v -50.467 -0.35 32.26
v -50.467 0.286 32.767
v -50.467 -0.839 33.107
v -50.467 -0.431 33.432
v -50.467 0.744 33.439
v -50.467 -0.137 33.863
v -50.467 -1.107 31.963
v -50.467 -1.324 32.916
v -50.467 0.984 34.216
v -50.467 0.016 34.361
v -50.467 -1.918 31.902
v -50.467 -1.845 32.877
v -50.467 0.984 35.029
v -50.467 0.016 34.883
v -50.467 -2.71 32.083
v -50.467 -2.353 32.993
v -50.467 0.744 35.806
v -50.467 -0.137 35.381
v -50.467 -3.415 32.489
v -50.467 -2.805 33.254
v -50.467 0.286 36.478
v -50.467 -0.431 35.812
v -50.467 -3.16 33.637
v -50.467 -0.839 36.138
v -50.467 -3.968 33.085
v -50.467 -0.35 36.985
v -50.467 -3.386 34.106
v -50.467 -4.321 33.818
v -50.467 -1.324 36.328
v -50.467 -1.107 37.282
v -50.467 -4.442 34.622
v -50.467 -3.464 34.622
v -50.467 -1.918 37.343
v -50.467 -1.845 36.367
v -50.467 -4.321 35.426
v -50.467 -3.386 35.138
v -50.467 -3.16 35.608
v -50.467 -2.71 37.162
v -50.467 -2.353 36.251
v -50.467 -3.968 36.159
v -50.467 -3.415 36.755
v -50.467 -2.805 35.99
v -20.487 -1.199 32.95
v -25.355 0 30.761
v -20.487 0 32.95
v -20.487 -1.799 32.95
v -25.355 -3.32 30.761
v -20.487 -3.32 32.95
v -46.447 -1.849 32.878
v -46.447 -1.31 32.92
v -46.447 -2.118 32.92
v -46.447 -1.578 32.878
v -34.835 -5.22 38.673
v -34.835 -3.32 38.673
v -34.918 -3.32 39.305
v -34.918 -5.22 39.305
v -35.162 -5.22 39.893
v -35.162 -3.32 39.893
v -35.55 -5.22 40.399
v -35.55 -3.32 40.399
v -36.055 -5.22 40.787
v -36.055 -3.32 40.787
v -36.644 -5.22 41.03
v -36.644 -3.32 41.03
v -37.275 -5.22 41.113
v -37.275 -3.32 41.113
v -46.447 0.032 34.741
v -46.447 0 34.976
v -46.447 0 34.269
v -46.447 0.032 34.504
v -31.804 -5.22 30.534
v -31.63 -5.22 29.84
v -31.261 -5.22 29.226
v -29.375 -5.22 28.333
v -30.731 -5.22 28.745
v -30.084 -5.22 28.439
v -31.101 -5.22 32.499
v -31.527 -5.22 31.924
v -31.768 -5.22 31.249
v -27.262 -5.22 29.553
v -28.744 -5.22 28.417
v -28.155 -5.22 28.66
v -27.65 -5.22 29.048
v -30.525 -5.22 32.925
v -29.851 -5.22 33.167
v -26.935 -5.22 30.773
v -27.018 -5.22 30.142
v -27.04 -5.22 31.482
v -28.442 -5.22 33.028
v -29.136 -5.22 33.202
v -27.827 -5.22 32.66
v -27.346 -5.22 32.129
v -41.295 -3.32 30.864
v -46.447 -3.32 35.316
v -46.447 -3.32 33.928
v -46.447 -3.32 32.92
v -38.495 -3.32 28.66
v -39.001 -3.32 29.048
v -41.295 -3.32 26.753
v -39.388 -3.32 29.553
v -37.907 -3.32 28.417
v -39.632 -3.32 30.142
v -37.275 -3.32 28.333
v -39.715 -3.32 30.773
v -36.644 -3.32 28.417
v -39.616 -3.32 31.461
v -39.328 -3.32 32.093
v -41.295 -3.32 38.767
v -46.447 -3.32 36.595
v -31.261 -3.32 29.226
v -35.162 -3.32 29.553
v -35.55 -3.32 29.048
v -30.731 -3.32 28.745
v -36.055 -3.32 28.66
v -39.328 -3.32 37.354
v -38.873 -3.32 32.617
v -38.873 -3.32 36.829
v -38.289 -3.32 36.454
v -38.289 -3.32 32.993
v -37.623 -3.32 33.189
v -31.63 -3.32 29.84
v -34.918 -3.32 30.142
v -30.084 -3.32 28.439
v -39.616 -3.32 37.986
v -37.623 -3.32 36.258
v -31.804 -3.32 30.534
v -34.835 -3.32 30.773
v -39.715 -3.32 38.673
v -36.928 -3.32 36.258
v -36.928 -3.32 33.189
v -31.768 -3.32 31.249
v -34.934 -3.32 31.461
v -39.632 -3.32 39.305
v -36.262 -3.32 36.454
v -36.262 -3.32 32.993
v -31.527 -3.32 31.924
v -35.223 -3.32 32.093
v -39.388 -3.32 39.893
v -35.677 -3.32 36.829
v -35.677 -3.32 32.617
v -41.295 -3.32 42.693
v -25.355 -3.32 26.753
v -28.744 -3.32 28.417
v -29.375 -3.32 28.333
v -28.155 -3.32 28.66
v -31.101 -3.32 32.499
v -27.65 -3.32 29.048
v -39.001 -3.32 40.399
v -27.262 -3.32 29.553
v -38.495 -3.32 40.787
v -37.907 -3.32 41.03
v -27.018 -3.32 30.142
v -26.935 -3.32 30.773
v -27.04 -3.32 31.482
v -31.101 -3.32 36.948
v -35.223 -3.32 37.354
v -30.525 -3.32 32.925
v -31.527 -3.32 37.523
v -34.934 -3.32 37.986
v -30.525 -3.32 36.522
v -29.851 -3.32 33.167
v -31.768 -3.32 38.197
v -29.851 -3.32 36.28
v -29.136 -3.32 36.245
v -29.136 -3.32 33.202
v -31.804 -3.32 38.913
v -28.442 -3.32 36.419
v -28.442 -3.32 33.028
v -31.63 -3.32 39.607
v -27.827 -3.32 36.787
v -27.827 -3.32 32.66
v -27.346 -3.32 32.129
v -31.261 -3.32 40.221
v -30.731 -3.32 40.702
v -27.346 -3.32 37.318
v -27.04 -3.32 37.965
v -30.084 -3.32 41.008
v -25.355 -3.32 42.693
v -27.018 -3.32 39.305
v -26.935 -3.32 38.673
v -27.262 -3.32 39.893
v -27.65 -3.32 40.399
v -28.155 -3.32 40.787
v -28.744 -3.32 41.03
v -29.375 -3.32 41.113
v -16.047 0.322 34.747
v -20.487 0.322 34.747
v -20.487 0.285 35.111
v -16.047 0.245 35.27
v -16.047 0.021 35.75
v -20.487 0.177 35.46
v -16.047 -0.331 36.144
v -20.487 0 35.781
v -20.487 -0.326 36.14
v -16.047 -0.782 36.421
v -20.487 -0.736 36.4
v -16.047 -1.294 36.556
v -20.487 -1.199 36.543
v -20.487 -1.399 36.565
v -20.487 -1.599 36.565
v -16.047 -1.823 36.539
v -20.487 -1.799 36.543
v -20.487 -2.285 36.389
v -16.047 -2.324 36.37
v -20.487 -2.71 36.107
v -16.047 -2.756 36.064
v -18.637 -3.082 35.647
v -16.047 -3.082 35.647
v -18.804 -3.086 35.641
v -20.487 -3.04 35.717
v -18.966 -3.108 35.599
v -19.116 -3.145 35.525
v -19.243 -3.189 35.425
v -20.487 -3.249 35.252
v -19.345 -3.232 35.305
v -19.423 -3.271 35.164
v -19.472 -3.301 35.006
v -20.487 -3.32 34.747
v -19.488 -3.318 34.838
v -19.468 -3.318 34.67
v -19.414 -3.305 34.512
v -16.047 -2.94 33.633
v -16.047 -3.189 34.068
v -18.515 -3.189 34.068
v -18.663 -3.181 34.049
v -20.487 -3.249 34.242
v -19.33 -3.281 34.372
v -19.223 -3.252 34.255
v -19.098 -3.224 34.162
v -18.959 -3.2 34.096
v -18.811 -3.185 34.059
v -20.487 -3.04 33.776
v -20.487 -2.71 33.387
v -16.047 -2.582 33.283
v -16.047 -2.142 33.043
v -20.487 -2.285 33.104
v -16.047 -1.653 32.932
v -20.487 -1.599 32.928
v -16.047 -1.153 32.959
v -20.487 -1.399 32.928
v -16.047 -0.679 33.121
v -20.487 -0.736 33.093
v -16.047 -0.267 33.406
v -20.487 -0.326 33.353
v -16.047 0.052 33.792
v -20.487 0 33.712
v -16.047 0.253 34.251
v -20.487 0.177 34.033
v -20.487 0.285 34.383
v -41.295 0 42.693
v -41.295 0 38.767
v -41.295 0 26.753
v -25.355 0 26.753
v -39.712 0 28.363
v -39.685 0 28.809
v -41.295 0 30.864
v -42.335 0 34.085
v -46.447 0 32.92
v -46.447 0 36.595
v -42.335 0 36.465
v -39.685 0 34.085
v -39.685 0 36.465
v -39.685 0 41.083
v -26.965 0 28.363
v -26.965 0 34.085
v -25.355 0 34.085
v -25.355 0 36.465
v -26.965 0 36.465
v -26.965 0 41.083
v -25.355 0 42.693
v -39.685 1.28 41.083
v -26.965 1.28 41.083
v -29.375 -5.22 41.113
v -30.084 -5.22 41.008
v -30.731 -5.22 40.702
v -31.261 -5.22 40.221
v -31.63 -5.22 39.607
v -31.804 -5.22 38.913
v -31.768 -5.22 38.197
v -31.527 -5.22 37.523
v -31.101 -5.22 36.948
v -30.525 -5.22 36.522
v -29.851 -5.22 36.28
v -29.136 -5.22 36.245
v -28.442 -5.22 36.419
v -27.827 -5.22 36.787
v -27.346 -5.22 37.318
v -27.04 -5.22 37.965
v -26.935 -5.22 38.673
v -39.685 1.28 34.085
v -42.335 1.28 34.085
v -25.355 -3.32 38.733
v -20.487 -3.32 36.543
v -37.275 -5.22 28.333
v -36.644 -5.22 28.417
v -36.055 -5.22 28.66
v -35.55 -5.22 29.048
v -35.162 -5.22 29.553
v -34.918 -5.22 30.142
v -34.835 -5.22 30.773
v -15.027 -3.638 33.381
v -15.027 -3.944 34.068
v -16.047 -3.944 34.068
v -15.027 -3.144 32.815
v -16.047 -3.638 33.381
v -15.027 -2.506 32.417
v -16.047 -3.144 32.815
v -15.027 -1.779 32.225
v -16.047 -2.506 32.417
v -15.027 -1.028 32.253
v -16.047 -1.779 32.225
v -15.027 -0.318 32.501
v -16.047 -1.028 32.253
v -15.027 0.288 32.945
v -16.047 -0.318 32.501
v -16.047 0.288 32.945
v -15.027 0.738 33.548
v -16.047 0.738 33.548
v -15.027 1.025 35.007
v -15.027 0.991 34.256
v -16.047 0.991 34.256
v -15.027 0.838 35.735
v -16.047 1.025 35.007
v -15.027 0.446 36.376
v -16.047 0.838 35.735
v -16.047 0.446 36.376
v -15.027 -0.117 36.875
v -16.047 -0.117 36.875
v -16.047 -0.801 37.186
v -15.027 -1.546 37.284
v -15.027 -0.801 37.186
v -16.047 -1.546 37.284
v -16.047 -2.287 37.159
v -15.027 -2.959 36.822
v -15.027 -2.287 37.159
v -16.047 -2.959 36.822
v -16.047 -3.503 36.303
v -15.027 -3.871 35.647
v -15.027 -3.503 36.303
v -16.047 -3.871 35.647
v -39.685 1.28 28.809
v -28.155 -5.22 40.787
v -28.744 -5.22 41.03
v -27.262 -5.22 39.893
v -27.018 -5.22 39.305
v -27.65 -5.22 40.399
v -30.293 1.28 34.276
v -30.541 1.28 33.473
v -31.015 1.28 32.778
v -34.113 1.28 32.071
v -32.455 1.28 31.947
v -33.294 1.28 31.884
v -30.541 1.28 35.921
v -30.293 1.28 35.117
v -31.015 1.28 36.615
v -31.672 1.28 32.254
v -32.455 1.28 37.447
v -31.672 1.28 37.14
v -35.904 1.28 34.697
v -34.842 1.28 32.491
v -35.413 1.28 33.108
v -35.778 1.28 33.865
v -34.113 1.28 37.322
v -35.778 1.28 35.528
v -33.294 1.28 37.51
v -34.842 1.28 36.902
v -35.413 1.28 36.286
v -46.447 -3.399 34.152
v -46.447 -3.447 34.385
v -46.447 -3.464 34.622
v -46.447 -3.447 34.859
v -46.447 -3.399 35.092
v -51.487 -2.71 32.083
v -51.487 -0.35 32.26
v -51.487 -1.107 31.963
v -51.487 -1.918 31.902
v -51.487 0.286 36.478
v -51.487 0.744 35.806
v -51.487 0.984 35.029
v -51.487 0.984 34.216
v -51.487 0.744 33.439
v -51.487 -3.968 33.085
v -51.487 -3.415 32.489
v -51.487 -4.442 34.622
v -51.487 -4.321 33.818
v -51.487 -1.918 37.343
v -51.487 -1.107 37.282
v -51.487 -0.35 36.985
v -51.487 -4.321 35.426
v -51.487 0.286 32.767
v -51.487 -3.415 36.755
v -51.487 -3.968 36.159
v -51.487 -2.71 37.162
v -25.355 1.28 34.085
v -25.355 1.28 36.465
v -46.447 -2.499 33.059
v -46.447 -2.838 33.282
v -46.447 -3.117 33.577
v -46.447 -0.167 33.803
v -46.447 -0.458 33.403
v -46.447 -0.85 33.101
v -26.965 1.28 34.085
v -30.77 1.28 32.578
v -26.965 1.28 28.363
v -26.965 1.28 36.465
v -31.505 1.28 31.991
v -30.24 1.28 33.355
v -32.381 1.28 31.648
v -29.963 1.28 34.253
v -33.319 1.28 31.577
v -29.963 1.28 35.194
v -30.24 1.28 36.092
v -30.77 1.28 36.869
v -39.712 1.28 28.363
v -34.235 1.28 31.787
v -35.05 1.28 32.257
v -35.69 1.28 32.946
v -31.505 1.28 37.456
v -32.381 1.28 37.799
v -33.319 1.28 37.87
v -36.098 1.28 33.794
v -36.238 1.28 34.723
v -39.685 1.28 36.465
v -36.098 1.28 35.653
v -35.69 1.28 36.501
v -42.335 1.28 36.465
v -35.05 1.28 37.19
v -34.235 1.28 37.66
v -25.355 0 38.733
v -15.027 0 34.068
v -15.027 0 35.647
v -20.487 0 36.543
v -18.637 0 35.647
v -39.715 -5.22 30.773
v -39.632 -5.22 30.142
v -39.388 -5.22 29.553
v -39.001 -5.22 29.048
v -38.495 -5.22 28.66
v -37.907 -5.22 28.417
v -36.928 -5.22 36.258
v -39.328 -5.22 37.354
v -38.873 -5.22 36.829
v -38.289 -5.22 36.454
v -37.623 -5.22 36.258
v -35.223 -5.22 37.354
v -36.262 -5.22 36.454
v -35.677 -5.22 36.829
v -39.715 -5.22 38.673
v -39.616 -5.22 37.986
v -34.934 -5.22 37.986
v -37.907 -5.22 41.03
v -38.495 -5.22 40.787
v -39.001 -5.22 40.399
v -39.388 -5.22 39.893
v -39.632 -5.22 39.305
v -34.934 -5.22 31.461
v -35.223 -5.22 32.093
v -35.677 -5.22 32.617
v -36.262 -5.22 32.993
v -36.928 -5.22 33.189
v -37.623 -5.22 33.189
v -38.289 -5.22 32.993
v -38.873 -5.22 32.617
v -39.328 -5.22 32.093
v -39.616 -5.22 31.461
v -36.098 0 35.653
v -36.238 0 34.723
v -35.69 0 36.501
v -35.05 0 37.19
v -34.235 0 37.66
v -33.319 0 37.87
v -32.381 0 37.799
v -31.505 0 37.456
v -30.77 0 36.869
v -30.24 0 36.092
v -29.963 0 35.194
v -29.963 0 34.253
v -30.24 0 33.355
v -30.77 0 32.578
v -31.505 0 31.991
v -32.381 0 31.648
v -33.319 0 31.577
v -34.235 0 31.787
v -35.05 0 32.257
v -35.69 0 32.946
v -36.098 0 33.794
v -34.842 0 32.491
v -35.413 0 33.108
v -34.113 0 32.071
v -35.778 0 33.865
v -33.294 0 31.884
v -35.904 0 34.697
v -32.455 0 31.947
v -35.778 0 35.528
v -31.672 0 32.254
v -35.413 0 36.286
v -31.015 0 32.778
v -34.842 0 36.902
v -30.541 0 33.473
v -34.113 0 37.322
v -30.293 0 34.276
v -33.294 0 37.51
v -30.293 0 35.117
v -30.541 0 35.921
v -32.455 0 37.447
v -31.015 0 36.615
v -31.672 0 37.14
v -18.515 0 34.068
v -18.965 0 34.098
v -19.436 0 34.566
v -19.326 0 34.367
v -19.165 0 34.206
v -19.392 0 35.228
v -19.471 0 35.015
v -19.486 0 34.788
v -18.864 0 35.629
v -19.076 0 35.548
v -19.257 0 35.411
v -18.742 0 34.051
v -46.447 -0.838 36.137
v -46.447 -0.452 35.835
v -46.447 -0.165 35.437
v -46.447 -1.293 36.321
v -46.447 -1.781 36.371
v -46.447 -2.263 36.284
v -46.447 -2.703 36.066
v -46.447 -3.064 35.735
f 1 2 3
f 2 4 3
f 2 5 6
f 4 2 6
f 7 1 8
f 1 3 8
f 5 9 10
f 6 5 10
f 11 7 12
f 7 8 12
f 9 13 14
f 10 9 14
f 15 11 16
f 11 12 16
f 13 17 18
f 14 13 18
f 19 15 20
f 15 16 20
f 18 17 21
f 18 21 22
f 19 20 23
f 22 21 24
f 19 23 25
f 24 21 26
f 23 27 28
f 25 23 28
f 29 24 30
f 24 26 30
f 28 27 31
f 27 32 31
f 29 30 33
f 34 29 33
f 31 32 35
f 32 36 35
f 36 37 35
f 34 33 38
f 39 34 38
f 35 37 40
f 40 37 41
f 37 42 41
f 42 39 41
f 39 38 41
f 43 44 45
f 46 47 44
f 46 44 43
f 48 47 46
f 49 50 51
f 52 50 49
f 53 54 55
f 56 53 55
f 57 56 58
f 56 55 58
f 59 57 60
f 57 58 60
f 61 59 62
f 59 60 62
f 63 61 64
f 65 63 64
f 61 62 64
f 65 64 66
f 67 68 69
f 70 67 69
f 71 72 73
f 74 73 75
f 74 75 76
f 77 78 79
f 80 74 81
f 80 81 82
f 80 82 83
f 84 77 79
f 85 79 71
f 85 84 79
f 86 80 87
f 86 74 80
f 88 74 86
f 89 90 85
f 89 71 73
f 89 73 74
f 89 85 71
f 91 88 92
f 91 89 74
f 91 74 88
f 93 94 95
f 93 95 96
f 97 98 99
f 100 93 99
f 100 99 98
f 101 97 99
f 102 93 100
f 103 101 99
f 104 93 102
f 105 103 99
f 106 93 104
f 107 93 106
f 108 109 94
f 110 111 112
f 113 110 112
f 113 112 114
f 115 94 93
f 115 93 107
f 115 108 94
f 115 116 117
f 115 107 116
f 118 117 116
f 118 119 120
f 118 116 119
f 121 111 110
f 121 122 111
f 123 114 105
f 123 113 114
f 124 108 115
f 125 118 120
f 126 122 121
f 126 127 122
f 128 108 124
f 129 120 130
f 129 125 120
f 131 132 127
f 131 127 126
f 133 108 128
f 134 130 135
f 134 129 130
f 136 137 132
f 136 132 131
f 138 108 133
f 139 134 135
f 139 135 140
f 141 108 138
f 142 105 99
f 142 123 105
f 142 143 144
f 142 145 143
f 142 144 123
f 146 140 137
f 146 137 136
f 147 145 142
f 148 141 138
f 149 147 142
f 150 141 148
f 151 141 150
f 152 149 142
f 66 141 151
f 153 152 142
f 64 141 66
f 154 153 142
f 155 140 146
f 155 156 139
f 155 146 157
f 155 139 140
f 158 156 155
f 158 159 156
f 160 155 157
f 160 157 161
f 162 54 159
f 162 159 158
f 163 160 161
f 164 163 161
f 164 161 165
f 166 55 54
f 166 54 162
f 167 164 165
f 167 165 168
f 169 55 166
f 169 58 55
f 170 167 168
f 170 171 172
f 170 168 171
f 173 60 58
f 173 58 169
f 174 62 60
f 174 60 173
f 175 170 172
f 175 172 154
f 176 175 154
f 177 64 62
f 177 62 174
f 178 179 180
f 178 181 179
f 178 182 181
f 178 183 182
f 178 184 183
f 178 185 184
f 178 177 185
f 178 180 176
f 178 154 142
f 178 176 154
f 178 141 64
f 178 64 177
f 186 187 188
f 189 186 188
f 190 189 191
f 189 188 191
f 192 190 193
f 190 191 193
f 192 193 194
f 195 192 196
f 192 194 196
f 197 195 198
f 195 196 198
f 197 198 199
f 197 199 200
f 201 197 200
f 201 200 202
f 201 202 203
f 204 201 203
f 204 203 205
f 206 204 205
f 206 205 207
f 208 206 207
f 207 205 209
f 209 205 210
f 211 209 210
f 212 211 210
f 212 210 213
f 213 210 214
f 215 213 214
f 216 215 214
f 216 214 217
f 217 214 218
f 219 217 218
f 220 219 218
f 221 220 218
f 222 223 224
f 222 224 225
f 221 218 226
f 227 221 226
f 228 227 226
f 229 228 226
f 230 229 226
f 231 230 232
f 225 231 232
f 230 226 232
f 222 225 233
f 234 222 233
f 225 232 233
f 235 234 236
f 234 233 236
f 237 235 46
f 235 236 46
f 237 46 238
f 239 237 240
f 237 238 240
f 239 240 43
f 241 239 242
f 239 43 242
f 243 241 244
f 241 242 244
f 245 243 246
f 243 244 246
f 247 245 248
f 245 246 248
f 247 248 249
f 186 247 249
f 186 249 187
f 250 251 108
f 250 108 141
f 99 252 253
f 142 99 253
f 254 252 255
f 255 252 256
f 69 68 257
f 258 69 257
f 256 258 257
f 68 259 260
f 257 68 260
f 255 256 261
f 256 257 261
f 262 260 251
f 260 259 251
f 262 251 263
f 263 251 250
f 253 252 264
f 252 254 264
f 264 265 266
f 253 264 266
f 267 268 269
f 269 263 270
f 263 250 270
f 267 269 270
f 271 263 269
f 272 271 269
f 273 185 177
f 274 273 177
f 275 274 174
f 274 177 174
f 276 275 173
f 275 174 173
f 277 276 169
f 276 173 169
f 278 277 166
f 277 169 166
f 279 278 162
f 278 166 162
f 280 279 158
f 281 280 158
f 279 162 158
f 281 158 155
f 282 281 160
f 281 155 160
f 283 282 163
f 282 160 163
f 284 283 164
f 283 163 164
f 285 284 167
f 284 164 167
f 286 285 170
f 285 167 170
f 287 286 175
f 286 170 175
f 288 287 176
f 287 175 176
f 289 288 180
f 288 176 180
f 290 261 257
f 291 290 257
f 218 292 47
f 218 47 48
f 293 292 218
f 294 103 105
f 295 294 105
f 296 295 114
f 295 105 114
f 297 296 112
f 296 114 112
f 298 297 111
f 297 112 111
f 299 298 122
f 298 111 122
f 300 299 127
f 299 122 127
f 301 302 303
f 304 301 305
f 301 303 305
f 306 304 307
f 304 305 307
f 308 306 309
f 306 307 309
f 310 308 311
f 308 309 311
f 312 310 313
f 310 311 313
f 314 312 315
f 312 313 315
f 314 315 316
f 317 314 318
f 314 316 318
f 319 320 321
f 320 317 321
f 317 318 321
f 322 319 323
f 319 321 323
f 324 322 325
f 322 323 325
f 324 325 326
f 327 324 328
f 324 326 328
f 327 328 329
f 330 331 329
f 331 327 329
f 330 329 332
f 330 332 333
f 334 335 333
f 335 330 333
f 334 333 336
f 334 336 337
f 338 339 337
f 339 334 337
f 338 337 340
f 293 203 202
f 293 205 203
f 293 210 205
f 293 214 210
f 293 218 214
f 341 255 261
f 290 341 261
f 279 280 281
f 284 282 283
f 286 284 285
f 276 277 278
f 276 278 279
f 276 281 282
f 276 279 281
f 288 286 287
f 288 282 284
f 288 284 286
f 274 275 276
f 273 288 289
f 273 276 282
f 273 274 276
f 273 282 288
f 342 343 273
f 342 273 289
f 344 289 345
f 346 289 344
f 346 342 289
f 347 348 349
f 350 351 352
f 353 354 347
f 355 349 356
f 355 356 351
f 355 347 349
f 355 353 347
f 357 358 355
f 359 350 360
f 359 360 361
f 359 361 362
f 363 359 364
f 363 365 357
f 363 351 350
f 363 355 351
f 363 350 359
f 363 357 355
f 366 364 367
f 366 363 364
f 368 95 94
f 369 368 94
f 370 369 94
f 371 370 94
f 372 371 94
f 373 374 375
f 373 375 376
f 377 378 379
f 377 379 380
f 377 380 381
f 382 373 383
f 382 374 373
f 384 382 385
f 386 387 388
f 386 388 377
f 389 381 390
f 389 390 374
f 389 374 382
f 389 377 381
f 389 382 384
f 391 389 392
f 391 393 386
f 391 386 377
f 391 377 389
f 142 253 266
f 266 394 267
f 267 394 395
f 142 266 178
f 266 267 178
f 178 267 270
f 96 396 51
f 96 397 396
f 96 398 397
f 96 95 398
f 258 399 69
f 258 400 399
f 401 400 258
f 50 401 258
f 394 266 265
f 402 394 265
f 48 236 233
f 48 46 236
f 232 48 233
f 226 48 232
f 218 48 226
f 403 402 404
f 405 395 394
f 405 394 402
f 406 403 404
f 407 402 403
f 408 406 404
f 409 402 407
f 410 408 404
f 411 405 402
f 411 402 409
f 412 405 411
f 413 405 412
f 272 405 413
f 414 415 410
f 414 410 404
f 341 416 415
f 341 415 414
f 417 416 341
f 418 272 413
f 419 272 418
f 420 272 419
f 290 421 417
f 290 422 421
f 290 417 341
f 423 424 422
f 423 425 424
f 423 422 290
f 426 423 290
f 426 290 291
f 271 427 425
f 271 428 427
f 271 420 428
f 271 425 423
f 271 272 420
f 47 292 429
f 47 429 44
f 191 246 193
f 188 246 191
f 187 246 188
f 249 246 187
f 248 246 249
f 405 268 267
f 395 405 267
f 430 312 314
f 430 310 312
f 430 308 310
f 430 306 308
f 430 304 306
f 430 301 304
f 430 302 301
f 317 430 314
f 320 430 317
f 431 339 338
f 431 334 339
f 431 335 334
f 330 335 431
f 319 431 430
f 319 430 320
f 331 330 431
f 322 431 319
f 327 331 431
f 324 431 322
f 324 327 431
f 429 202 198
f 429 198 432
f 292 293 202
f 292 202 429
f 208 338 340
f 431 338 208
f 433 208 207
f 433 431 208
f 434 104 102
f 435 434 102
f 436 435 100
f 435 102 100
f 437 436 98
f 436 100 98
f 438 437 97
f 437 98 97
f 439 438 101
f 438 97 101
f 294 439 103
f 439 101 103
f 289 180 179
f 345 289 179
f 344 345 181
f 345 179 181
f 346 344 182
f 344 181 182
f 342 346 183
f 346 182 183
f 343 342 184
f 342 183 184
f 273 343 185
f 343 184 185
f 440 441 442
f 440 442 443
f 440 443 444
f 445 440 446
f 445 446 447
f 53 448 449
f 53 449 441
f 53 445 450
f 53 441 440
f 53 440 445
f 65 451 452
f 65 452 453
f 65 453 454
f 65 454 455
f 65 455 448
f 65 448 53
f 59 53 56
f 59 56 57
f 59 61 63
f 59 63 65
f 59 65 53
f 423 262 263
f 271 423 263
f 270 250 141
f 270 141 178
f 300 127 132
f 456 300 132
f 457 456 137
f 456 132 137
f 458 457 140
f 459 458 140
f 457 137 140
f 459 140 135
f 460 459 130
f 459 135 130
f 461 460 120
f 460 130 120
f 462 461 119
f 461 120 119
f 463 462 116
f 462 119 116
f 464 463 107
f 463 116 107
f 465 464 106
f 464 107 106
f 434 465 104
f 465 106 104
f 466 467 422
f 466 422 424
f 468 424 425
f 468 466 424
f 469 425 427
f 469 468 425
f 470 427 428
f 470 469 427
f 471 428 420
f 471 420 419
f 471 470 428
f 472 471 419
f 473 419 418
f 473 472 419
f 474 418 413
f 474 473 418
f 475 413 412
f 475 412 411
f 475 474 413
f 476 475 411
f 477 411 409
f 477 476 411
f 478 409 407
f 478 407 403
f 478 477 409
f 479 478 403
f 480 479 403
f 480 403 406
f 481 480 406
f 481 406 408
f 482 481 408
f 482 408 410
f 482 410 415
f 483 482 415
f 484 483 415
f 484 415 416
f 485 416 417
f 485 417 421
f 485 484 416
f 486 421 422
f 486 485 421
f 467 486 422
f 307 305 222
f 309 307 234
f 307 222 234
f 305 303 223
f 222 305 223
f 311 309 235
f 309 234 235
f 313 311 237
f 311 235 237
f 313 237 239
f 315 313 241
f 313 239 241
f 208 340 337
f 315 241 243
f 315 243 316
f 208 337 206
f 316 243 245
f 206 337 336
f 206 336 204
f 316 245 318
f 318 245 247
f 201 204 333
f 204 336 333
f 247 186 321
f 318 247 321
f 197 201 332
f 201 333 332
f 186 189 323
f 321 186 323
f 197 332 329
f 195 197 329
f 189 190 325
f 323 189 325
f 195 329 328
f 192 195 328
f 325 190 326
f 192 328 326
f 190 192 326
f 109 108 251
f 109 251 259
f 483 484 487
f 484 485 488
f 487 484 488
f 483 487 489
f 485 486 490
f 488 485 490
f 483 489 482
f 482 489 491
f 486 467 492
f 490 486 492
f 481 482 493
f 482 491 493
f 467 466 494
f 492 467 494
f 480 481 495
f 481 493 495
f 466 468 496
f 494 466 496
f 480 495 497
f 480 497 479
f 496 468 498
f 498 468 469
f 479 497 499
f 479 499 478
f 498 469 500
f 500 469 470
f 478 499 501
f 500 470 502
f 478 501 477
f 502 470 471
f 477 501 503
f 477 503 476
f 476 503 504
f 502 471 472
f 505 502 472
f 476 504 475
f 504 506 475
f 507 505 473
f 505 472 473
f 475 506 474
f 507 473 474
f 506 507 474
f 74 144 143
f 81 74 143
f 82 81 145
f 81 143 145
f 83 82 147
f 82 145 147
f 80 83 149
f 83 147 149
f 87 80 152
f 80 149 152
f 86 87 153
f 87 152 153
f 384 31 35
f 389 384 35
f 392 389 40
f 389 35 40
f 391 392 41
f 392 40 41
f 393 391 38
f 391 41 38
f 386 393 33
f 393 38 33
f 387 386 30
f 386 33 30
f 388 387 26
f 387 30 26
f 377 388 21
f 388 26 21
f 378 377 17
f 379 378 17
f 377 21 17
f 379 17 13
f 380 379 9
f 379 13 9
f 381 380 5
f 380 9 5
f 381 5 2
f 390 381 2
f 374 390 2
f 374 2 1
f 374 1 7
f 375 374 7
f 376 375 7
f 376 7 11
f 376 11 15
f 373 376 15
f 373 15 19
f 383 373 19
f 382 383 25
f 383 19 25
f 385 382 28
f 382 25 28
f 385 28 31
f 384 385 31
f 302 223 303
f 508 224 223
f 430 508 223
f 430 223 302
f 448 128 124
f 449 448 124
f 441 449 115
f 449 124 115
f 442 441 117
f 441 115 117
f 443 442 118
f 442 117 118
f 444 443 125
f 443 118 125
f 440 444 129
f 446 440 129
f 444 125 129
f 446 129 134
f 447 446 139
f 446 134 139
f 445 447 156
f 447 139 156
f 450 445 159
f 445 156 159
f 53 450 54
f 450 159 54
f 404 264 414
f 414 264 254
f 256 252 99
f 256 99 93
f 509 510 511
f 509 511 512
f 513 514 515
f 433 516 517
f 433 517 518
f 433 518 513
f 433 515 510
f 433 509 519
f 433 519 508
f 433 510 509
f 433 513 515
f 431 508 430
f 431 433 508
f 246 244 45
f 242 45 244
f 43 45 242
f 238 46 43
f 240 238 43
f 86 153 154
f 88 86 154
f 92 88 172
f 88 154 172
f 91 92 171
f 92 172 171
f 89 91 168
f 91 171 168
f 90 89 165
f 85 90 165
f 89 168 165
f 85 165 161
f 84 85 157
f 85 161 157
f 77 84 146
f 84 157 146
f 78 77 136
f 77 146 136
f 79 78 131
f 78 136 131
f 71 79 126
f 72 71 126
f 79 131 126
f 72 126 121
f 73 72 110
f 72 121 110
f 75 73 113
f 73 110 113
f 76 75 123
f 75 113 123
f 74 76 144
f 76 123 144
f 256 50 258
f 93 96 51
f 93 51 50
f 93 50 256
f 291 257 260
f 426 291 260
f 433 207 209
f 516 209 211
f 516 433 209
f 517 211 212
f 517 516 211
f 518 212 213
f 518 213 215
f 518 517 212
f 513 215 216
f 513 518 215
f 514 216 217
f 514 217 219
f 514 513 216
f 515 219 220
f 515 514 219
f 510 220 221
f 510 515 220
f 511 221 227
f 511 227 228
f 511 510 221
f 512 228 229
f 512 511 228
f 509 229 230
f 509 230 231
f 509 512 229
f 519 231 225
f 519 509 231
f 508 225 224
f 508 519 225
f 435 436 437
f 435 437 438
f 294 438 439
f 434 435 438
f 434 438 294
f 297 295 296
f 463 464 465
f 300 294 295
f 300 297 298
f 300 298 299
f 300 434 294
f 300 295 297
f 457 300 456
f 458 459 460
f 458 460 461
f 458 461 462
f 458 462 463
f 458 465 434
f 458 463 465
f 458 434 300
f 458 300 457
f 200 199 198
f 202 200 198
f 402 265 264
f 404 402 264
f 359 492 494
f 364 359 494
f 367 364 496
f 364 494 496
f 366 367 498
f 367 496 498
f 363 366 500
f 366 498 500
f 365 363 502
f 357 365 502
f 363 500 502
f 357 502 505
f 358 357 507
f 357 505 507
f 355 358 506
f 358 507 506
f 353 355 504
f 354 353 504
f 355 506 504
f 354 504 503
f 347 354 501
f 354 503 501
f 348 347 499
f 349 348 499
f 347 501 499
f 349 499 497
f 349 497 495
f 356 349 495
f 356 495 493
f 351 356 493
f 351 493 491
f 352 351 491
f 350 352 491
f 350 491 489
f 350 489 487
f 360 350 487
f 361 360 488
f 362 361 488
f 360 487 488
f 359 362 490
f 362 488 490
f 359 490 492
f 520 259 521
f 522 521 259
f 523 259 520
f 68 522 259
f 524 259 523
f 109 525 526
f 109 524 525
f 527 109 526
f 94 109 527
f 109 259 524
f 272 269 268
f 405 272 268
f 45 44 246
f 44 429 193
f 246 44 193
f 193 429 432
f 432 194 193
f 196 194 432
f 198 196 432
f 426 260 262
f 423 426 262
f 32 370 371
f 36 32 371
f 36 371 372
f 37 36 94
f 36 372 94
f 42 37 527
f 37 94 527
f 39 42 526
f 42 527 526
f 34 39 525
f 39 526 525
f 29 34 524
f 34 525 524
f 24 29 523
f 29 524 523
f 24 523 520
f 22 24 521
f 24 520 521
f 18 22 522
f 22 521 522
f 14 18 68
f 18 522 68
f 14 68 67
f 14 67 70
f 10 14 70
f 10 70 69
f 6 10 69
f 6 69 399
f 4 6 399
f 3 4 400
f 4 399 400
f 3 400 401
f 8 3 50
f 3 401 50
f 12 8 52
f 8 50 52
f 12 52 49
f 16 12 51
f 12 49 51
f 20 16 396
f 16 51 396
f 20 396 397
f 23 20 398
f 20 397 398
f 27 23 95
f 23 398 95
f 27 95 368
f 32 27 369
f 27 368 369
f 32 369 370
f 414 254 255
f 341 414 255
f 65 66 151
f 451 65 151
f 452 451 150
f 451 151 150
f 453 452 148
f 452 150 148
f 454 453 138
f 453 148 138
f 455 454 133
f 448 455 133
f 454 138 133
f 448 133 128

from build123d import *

# Parameters (mm, degrees)
F0_W      = 15.94
F0_H      = 15.94
F1_DEPTH  = 3.32
F3_DEPTH  = 1.9
F5_DEPTH  = 3.32
F6_R      = 1.821101858
F7_DEPTH  = 4.44
F8_R      = 2.5375428774
F9_DEPTH  = 1.02
F10_W     = 0.2336027101
F10_H     = 1.5795752406
F11_DEPTH = 6
F14_DEPTH = 3.32
F15_R     = 1.749817918
F16_DEPTH = 4.02
F17_R     = 2.7280982188
F18_DEPTH = 1.02
F19_R     = 3.15499311
F19_R_2   = 2.8208099917
F20_DEPTH = 1.28


# Not quite as in the source:
# - a feature names something its author has since deleted; it is built from what else it names


with BuildPart() as f1:
    # F0 (on Front) → F1 (new body)
    with BuildSketch(Plane.XZ):
        with Locations((-33.325266093, 34.7234688458)):
            Rectangle(F0_W, F0_H)
    extrude(amount=F1_DEPTH)

    # F2 (on face) → F3 (join)
    with BuildSketch(Plane.XZ.offset(3.32)):
        with BuildLine():
            ThreePointArc((-39.715266093, 38.6734688458), (-37.275266093, 36.2334688458), (-34.835266093, 38.6734688458))
            ThreePointArc((-34.835266093, 38.6734688458), (-35.5499255469, 40.3988093919), (-37.275266093, 41.1134688458))
            ThreePointArc((-37.275266093, 41.1134688458), (-39.0006066391, 40.3988093919), (-39.715266093, 38.6734688458))
        make_face()
        with BuildLine():
            ThreePointArc((-29.375266093, 41.1134688458), (-31.1006066391, 36.9481282997), (-26.935266093, 38.6734688458))
            ThreePointArc((-26.935266093, 38.6734688458), (-27.6499255469, 40.3988093919), (-29.375266093, 41.1134688458))
        make_face()
        with BuildLine():
            ThreePointArc((-37.275266093, 28.3334688458), (-35.5499255469, 29.0481282997), (-34.835266093, 30.7734688458))
            ThreePointArc((-34.835266093, 30.7734688458), (-37.275266093, 33.2134688458), (-39.715266093, 30.7734688458))
            ThreePointArc((-39.715266093, 30.7734688458), (-39.0006066391, 29.0481282997), (-37.275266093, 28.3334688458))
        make_face()
        with BuildLine():
            ThreePointArc((-29.375266093, 28.3334688458), (-27.6499255469, 29.0481282997), (-26.935266093, 30.7734688458))
            ThreePointArc((-26.935266093, 30.7734688458), (-31.1006066391, 32.4988093919), (-29.375266093, 28.3334688458))
        make_face()
    extrude(amount=F3_DEPTH)

    # F13 (on face) → F14 (join)
    with BuildSketch(Plane.XZ.offset(3.32)):
        Polygon((-46.4471168816, 36.5953333676), (-46.4471168816, 32.9196825624), (-41.2719324231, 30.8542419225), (-41.2719324231, 38.7770831585), align=None)
    extrude(amount=-F14_DEPTH)

    # F15 (on face) → F16 (join)
    with BuildSketch(Plane(origin=(-46.4471168816, 0, 0), x_dir=(0, -1, 0), z_dir=(-1, 0, 0))):
        with Locations((1.7137768446, 34.6222557127)):
            Circle(F15_R)
    extrude(amount=F16_DEPTH)

    # F17 (on face) → F18 (join)
    with BuildSketch(Plane(origin=(-50.4671168816, 0, 0), x_dir=(0, -1, 0), z_dir=(-1, 0, 0))):
        with Locations((1.7137768446, 34.6222557127)):
            Circle(F17_R)
    extrude(amount=F18_DEPTH)

    # F19 (on face) → F20 (join)
    with BuildSketch(Plane(origin=(0, 0, 0), x_dir=(-1, 0, 0), z_dir=(0, 1, 0))):
        Polygon((39.685266093, 41.0834688458), (26.965266093, 41.0834688458), (26.965266093, 36.464726125), (25.355266093, 36.464726125), (25.355266093, 34.084726125), (26.965266093, 34.084726125), (26.965266093, 29.2574396769), (26.965266093, 28.3634688458), (39.7119224072, 28.3634688458), (39.685266093, 28.8085116733), (39.685266093, 34.084726125), (42.335266093, 34.084726125), (42.335266093, 36.464726125), (39.685266093, 36.464726125), align=None)
        with Locations((33.0827943981, 34.7234688458)):
            Circle(F19_R, mode=Mode.SUBTRACT)
        with Locations((33.0827943981, 34.6966460347)):
            Circle(F19_R_2)
    extrude(amount=F20_DEPTH)


with BuildPart() as f5:
    # F4 (on face) → F5 (new body)
    with BuildSketch(Plane.XZ.offset(3.32)):
        Polygon((-20.4874705523, 36.5429800004), (-25.355266093, 38.7327224016), (-25.355266093, 30.7607483119), (-20.4874705523, 32.9504907131), align=None)
    extrude(amount=-F5_DEPTH)

    # F6 (on face) → F7 (join)
    with BuildSketch(Plane.YZ.offset(-20.4874705523)):
        with Locations((-1.498898142, 34.7467353567)):
            Circle(F6_R)
    extrude(amount=F7_DEPTH)

    # F8 (on face) → F9 (join)
    with BuildSketch(Plane.YZ.offset(-16.0474705523)):
        with Locations((-1.498898142, 34.7467353567)):
            Circle(F8_R)
    extrude(amount=F9_DEPTH)

    # F10 (on Front) → F11 (cut)
    with BuildSketch(Plane.XZ):
        with BuildLine():
            Line((-15.0415301323, 35.6473438442), (-18.6368469149, 35.6473438442))
            ThreePointArc((-18.6368469149, 35.6473438442), (-19.4855509584, 34.7875979099), (-18.5153409839, 34.0677686036))
            Line((-18.5153409839, 34.0677686036), (-15.0415301323, 34.0677686036))
            Line((-15.0415301323, 34.0677686036), (-15.0415301323, 35.6473438442))
        make_face()
        with Locations((-14.9247287773, 34.8575562239)):
            Rectangle(F10_W, F10_H)
    extrude(amount=F11_DEPTH, mode=Mode.SUBTRACT)


solid = Compound([f1.part, f5.part])
